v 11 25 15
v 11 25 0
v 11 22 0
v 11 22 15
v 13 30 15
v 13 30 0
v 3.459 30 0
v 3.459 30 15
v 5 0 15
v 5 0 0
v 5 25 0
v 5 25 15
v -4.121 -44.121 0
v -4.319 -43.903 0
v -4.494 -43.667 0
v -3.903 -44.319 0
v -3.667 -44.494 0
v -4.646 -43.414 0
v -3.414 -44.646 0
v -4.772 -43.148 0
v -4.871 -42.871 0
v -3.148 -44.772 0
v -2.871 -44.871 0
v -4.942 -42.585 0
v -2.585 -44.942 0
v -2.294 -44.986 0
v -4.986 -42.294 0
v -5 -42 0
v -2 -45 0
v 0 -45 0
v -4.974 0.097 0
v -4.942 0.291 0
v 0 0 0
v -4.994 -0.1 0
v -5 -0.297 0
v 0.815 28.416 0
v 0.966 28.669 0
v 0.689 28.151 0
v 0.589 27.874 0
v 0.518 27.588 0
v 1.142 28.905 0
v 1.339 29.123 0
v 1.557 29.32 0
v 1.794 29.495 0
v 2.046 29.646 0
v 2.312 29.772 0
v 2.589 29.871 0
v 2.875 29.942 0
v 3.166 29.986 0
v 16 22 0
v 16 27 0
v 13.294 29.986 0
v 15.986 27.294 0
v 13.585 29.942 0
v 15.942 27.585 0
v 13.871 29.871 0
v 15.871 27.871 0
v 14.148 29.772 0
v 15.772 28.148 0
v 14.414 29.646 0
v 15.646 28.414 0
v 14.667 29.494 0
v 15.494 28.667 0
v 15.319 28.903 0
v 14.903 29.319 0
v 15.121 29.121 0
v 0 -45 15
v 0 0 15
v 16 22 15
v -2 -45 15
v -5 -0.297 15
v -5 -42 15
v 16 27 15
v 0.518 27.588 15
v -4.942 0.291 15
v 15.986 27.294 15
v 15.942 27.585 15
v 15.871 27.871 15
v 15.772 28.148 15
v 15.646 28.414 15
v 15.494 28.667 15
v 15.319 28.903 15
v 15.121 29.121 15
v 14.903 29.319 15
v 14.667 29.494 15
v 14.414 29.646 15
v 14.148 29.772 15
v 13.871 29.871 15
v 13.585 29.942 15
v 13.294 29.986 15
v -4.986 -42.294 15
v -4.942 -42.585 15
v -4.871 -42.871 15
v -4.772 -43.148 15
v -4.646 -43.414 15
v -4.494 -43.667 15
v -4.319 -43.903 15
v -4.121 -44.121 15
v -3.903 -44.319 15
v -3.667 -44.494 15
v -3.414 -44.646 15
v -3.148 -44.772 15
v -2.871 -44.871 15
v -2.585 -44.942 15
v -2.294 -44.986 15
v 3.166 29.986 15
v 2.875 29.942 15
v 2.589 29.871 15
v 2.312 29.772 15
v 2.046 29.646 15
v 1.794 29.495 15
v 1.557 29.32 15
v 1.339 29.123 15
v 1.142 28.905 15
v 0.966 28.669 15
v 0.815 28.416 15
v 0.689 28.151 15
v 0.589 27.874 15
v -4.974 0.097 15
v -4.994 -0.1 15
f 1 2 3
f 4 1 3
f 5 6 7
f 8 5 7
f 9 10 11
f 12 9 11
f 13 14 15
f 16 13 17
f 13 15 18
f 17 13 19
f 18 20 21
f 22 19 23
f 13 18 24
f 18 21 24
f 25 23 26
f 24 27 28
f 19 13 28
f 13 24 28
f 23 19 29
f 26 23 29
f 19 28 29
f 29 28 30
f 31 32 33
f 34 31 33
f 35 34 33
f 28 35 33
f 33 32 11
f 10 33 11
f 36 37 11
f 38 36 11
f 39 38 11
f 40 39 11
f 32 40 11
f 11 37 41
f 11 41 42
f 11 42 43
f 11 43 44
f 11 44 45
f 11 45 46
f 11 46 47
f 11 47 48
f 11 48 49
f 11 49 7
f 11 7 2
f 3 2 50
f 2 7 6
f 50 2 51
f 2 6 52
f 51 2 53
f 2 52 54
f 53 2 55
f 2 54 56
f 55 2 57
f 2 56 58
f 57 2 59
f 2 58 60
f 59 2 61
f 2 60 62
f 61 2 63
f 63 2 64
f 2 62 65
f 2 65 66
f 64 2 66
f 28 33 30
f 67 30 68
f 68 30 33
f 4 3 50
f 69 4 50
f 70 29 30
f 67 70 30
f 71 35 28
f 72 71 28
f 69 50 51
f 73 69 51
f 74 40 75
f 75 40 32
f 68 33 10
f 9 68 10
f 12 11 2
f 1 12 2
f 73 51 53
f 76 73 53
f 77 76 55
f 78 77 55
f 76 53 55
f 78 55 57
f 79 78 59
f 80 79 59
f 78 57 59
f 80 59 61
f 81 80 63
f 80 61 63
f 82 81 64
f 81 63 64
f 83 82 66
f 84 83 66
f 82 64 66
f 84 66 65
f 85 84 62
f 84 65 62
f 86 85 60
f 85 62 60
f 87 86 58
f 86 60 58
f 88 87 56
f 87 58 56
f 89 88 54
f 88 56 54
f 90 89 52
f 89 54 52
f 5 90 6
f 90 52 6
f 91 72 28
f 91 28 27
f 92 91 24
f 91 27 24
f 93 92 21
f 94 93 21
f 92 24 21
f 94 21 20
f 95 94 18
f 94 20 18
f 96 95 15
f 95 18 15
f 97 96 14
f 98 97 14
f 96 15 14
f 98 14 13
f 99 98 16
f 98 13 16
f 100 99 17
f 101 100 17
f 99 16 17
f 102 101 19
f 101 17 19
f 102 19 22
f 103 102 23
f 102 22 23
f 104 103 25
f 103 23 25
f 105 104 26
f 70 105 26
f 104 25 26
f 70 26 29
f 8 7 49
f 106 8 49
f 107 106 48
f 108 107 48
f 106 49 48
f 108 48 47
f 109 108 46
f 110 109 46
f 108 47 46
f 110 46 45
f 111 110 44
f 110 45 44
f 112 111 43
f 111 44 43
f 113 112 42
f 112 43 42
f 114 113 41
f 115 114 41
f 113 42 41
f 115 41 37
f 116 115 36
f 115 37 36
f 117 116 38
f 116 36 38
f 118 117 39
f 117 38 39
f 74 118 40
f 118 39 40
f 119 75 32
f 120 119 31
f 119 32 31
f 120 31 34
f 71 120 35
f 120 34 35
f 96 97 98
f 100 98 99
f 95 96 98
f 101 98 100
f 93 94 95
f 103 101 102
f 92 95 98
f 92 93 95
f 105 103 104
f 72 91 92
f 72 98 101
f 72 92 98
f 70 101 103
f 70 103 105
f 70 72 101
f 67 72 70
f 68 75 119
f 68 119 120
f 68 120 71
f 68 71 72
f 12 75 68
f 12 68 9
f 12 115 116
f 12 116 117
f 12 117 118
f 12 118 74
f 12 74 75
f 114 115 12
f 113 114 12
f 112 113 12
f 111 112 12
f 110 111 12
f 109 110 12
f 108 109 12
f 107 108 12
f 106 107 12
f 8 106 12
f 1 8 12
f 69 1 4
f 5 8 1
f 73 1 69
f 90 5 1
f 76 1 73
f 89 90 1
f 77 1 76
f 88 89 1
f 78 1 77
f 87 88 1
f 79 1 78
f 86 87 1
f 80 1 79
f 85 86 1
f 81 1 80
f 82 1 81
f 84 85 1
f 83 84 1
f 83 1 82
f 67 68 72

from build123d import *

# Parameters (mm, degrees)
F1_DEPTH = 15


with BuildPart() as f1:
    # F0 (on Top) → F1 (new body)
    with BuildSketch(Plane.XY):
        with BuildLine():
            ThreePointArc((-5, -42), (-4.12132, -44.12132), (-2, -45))
            Line((-2, -45), (0, -45))
            Line((0, -45), (0, 0))
            Line((0, 0), (5, 0))
            Line((5, 0), (5, 25))
            Line((5, 25), (11, 25))
            Line((11, 25), (11, 22))
            Line((11, 22), (16, 22))
            Line((16, 22), (16, 27))
            ThreePointArc((16, 27), (15.12132, 29.12132), (13, 30))
            Line((13, 30), (3.459412, 30))
            ThreePointArc((3.459412, 30), (1.557445, 29.320026), (0.51767, 27.588348))
            Line((0.51767, 27.588348), (-4.941742, 0.29129))
            ThreePointArc((-4.941742, 0.29129), (-4.9854, -0.001446), (-5, -0.297059))
            Line((-5, -0.297059), (-5, -42))
        make_face()
    extrude(amount=F1_DEPTH)


solid = f1.part
